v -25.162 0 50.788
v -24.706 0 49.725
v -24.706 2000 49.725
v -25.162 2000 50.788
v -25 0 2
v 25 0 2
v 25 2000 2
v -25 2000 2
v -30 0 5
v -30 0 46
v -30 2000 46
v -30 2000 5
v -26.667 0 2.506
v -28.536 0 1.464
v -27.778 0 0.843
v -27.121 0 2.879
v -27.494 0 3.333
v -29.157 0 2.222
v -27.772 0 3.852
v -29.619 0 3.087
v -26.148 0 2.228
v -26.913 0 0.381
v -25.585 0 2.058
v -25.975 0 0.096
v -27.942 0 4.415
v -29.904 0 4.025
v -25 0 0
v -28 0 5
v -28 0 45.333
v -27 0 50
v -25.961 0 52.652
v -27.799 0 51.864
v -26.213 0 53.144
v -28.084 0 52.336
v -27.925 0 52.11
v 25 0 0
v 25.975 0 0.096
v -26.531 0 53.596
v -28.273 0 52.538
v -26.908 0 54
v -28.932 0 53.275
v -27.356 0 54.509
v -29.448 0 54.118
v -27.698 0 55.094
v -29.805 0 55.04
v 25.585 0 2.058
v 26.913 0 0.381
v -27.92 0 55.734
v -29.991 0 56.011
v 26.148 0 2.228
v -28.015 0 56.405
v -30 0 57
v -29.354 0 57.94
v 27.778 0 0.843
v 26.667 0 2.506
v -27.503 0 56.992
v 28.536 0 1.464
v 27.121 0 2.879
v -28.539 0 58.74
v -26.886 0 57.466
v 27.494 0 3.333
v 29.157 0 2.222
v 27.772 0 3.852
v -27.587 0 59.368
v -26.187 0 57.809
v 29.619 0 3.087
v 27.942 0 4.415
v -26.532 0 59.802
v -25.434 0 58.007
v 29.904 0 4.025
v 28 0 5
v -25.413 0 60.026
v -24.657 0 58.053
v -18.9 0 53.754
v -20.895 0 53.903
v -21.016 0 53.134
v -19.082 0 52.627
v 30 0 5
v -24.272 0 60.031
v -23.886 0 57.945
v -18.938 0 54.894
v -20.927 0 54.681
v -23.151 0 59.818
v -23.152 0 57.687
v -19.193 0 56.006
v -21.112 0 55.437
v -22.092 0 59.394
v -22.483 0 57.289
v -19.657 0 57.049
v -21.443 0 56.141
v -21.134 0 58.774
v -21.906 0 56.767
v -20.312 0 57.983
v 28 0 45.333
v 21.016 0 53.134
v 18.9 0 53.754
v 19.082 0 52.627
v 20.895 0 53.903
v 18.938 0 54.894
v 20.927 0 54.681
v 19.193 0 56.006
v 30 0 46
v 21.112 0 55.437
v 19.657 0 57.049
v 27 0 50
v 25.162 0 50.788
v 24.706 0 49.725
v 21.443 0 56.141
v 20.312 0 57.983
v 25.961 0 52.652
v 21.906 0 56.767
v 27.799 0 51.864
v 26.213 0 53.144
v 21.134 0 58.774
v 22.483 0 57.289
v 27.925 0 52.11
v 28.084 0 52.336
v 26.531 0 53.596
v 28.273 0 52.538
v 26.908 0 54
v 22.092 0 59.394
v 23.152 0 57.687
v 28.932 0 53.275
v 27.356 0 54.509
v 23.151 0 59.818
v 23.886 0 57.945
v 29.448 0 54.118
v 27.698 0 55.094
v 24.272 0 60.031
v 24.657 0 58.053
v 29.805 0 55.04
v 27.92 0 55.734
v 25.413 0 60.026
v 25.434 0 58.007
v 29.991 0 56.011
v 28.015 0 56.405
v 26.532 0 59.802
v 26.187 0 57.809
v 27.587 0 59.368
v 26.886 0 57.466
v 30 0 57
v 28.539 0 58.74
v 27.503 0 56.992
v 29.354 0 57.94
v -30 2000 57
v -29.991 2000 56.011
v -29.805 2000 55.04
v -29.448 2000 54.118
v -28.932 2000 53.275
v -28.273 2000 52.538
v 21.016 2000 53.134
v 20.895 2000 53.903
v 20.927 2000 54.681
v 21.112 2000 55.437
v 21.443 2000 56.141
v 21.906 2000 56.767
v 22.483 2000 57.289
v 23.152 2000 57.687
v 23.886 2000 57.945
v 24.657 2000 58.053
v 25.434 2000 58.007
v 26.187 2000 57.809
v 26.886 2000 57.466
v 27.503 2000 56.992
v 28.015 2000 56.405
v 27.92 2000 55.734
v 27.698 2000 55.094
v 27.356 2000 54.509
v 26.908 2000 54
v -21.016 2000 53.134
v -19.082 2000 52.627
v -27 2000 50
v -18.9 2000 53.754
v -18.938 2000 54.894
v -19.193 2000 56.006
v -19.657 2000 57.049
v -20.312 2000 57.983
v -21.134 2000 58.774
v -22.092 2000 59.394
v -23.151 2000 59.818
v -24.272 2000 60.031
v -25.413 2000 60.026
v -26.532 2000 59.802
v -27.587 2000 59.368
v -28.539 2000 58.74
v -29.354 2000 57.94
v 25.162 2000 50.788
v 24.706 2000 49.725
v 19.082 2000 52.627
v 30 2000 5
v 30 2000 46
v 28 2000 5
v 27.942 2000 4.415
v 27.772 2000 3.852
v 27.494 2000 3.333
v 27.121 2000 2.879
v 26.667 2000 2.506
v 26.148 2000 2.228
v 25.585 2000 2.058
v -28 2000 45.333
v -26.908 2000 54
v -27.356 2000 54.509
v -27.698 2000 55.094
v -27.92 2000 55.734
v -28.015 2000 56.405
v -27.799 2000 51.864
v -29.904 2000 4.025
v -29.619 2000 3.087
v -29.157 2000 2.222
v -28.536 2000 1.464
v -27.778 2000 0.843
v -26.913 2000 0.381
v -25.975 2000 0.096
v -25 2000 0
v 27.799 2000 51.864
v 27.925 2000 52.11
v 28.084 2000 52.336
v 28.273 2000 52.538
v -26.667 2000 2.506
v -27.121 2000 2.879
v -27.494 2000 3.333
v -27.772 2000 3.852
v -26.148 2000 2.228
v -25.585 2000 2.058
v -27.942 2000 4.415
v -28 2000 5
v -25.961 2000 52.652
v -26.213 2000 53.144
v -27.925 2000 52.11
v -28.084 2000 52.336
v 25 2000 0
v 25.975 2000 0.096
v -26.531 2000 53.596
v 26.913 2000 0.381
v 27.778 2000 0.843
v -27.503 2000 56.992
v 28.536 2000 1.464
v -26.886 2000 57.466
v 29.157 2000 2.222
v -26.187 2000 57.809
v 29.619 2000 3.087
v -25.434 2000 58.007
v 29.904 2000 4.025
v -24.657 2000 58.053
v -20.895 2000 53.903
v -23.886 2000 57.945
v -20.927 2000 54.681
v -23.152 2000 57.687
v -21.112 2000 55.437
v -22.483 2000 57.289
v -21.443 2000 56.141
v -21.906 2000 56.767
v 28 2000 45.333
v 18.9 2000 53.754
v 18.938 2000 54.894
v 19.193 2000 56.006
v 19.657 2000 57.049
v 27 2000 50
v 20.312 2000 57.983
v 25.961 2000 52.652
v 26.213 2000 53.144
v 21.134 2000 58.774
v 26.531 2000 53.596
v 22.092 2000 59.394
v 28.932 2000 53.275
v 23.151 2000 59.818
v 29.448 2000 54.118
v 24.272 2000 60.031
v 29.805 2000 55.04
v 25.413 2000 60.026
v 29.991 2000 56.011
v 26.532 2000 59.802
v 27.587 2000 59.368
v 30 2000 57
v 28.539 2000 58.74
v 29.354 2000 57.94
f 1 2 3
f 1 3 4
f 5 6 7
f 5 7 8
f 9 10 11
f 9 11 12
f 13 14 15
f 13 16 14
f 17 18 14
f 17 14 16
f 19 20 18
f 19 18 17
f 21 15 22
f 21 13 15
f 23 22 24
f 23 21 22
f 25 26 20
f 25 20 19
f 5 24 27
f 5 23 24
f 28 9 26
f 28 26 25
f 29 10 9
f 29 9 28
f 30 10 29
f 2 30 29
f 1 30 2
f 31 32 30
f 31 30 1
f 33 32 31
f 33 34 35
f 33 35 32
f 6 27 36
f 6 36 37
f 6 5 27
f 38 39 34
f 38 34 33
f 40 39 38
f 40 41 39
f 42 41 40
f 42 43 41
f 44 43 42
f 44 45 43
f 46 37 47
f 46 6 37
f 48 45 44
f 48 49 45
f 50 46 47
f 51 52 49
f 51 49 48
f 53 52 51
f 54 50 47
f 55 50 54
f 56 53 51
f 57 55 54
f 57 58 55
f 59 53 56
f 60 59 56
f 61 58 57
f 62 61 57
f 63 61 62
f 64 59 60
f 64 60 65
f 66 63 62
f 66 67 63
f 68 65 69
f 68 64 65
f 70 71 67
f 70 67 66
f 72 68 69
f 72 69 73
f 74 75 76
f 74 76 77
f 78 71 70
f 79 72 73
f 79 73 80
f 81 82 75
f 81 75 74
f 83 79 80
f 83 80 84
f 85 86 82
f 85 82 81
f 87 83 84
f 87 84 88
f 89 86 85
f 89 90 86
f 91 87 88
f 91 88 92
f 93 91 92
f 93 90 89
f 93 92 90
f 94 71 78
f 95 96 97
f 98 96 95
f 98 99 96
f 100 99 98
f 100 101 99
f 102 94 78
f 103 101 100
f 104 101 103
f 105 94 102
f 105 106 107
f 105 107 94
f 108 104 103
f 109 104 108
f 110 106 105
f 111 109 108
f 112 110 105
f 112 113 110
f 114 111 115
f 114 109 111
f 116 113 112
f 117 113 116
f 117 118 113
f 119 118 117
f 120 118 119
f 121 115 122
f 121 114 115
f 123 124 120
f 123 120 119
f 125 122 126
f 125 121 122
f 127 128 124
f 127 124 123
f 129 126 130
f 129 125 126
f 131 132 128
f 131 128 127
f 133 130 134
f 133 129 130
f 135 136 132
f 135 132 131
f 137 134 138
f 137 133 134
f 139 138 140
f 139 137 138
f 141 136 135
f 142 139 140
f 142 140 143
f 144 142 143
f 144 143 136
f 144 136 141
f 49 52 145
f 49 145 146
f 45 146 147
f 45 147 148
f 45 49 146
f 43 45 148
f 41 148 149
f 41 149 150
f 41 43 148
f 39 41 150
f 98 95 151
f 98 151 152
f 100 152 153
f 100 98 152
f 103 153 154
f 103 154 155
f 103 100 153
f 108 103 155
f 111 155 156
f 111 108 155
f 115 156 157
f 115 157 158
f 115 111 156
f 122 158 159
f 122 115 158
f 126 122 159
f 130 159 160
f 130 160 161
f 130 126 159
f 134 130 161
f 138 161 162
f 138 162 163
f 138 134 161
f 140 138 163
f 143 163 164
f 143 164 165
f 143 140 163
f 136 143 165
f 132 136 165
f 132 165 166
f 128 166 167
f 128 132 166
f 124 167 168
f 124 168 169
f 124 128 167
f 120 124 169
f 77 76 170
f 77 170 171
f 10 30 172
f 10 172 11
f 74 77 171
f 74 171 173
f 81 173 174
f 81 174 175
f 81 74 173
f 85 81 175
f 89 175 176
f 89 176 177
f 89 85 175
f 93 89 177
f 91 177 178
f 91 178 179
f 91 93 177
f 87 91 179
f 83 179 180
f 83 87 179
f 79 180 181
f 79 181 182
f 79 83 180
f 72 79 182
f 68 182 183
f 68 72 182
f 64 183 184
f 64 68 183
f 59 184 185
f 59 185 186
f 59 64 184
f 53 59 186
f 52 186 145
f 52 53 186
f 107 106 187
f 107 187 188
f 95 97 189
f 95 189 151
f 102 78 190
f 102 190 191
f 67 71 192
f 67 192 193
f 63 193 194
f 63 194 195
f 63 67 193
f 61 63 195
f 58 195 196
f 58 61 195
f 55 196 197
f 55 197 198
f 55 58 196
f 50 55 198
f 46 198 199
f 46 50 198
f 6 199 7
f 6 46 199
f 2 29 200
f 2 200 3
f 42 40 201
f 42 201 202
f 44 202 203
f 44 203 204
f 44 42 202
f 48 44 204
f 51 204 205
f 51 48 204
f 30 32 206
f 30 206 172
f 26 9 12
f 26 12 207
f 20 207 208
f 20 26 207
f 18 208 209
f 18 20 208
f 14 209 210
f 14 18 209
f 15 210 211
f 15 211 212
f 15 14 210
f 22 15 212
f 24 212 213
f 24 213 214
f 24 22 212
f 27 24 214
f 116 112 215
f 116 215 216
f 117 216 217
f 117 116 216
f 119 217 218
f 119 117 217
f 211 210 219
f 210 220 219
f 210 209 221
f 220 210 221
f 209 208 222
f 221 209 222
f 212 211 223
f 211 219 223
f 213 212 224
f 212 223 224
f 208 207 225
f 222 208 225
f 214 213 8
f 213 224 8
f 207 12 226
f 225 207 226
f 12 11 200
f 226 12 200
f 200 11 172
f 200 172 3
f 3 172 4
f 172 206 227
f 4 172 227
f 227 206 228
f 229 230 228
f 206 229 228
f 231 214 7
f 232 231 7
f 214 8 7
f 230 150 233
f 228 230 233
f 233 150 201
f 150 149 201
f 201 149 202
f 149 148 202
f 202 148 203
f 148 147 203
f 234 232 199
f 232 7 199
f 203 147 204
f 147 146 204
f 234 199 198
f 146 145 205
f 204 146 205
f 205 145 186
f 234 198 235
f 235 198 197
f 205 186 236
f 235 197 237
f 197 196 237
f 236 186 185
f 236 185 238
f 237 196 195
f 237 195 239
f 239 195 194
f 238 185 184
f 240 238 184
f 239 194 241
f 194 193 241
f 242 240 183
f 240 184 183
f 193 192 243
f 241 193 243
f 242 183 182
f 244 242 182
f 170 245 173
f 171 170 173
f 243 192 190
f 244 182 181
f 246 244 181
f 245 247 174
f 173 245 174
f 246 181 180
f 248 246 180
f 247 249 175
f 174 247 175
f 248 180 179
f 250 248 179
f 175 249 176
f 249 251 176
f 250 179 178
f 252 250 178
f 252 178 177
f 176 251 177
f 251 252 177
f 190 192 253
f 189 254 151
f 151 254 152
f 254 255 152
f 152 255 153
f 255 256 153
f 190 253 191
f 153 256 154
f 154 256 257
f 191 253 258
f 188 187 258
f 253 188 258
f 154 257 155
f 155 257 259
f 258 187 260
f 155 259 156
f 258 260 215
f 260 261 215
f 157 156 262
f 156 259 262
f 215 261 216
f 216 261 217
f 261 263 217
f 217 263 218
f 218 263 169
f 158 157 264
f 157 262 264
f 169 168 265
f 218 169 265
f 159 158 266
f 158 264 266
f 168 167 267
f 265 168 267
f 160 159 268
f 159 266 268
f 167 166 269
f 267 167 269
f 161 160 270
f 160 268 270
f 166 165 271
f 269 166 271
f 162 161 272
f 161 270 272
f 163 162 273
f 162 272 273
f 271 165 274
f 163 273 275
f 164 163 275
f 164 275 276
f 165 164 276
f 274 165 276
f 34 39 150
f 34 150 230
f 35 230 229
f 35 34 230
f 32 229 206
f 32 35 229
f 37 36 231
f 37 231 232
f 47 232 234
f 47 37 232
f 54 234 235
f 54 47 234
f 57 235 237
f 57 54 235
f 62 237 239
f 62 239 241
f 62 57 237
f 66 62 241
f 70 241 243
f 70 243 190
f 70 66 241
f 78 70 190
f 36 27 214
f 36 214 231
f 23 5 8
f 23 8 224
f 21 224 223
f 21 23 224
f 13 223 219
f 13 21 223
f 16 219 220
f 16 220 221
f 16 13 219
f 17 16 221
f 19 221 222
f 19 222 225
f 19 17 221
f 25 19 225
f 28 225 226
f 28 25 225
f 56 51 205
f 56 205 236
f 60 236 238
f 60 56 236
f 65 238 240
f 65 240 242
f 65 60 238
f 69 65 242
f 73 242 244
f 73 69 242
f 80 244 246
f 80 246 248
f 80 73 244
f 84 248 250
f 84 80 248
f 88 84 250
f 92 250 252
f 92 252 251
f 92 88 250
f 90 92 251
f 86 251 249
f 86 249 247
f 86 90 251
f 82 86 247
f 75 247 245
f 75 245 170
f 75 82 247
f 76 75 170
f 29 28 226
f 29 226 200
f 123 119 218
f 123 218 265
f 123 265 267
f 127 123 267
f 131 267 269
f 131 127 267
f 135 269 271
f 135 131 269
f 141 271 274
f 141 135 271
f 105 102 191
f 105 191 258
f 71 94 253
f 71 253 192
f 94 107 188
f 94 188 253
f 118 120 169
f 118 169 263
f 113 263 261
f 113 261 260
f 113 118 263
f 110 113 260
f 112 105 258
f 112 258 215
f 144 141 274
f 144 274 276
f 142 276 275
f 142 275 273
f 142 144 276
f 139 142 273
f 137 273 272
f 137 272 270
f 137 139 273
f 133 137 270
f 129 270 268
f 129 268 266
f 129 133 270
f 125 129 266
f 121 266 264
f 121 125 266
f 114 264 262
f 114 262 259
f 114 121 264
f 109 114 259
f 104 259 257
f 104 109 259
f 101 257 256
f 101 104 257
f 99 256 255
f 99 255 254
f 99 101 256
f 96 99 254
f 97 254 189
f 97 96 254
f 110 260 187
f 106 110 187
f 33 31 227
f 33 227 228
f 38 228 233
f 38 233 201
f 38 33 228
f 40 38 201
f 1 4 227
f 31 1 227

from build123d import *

# Parameters (mm, degrees)
F1_DEPTH = 2000


with BuildPart() as f1:
    # F0 (on Front) → F1 (new body)
    with BuildSketch(Plane.XZ):
        with BuildLine():
            Line((-25, 0), (0, 0))
            Line((0, 0), (25, 0))
            ThreePointArc((25, 0), (28.535534, 1.464466), (30, 5))
            Line((30, 5), (30, 46))
            Line((30, 46), (27, 50))
            Line((27, 50), (27.798945, 51.864205))
            ThreePointArc((27.798945, 51.864205), (28.000636, 52.22595), (28.272511, 52.538396))
            ThreePointArc((28.272511, 52.538396), (29.647293, 54.571329), (30, 57))
            ThreePointArc((30, 57), (22.611278, 59.631425), (19.08164, 52.627194))
            Line((19.08164, 52.627194), (21.016316, 53.134174))
            ThreePointArc((21.016316, 53.134174), (23.152059, 57.686868), (28.01478, 56.405318))
            ThreePointArc((28.01478, 56.405318), (27.697789, 55.094007), (26.907788, 54.000425))
            ThreePointArc((26.907788, 54.000425), (26.364036, 53.375534), (25.960655, 52.652043))
            Line((25.960655, 52.652043), (25.16171, 50.787839))
            Line((25.16171, 50.787839), (24.706223, 49.725036))
            Line((24.706223, 49.725036), (28, 45.333333))
            Line((28, 45.333333), (28, 5))
            ThreePointArc((28, 5), (27.12132, 2.87868), (25, 2))
            Line((25, 2), (0, 2))
            Line((0, 2), (-25, 2))
            ThreePointArc((-25, 2), (-27.12132, 2.87868), (-28, 5))
            Line((-28, 5), (-28, 45.333333))
            Line((-28, 45.333333), (-24.706223, 49.725036))
            Line((-24.706223, 49.725036), (-25.16171, 50.787839))
            Line((-25.16171, 50.787839), (-25.960655, 52.652043))
            ThreePointArc((-25.960655, 52.652043), (-26.364036, 53.375534), (-26.907788, 54.000425))
            ThreePointArc((-26.907788, 54.000425), (-27.697789, 55.094007), (-28.01478, 56.405318))
            ThreePointArc((-28.01478, 56.405318), (-23.152059, 57.686868), (-21.016316, 53.134174))
            Line((-21.016316, 53.134174), (-19.08164, 52.627194))
            ThreePointArc((-19.08164, 52.627194), (-22.611278, 59.631425), (-30, 57))
            ThreePointArc((-30, 57), (-29.647293, 54.571329), (-28.272511, 52.538396))
            ThreePointArc((-28.272511, 52.538396), (-28.000636, 52.22595), (-27.798945, 51.864205))
            Line((-27.798945, 51.864205), (-27, 50))
            Line((-27, 50), (-30, 46))
            Line((-30, 46), (-30, 5))
            ThreePointArc((-30, 5), (-28.535534, 1.464466), (-25, 0))
        make_face()
    extrude(amount=-F1_DEPTH)


solid = f1.part
